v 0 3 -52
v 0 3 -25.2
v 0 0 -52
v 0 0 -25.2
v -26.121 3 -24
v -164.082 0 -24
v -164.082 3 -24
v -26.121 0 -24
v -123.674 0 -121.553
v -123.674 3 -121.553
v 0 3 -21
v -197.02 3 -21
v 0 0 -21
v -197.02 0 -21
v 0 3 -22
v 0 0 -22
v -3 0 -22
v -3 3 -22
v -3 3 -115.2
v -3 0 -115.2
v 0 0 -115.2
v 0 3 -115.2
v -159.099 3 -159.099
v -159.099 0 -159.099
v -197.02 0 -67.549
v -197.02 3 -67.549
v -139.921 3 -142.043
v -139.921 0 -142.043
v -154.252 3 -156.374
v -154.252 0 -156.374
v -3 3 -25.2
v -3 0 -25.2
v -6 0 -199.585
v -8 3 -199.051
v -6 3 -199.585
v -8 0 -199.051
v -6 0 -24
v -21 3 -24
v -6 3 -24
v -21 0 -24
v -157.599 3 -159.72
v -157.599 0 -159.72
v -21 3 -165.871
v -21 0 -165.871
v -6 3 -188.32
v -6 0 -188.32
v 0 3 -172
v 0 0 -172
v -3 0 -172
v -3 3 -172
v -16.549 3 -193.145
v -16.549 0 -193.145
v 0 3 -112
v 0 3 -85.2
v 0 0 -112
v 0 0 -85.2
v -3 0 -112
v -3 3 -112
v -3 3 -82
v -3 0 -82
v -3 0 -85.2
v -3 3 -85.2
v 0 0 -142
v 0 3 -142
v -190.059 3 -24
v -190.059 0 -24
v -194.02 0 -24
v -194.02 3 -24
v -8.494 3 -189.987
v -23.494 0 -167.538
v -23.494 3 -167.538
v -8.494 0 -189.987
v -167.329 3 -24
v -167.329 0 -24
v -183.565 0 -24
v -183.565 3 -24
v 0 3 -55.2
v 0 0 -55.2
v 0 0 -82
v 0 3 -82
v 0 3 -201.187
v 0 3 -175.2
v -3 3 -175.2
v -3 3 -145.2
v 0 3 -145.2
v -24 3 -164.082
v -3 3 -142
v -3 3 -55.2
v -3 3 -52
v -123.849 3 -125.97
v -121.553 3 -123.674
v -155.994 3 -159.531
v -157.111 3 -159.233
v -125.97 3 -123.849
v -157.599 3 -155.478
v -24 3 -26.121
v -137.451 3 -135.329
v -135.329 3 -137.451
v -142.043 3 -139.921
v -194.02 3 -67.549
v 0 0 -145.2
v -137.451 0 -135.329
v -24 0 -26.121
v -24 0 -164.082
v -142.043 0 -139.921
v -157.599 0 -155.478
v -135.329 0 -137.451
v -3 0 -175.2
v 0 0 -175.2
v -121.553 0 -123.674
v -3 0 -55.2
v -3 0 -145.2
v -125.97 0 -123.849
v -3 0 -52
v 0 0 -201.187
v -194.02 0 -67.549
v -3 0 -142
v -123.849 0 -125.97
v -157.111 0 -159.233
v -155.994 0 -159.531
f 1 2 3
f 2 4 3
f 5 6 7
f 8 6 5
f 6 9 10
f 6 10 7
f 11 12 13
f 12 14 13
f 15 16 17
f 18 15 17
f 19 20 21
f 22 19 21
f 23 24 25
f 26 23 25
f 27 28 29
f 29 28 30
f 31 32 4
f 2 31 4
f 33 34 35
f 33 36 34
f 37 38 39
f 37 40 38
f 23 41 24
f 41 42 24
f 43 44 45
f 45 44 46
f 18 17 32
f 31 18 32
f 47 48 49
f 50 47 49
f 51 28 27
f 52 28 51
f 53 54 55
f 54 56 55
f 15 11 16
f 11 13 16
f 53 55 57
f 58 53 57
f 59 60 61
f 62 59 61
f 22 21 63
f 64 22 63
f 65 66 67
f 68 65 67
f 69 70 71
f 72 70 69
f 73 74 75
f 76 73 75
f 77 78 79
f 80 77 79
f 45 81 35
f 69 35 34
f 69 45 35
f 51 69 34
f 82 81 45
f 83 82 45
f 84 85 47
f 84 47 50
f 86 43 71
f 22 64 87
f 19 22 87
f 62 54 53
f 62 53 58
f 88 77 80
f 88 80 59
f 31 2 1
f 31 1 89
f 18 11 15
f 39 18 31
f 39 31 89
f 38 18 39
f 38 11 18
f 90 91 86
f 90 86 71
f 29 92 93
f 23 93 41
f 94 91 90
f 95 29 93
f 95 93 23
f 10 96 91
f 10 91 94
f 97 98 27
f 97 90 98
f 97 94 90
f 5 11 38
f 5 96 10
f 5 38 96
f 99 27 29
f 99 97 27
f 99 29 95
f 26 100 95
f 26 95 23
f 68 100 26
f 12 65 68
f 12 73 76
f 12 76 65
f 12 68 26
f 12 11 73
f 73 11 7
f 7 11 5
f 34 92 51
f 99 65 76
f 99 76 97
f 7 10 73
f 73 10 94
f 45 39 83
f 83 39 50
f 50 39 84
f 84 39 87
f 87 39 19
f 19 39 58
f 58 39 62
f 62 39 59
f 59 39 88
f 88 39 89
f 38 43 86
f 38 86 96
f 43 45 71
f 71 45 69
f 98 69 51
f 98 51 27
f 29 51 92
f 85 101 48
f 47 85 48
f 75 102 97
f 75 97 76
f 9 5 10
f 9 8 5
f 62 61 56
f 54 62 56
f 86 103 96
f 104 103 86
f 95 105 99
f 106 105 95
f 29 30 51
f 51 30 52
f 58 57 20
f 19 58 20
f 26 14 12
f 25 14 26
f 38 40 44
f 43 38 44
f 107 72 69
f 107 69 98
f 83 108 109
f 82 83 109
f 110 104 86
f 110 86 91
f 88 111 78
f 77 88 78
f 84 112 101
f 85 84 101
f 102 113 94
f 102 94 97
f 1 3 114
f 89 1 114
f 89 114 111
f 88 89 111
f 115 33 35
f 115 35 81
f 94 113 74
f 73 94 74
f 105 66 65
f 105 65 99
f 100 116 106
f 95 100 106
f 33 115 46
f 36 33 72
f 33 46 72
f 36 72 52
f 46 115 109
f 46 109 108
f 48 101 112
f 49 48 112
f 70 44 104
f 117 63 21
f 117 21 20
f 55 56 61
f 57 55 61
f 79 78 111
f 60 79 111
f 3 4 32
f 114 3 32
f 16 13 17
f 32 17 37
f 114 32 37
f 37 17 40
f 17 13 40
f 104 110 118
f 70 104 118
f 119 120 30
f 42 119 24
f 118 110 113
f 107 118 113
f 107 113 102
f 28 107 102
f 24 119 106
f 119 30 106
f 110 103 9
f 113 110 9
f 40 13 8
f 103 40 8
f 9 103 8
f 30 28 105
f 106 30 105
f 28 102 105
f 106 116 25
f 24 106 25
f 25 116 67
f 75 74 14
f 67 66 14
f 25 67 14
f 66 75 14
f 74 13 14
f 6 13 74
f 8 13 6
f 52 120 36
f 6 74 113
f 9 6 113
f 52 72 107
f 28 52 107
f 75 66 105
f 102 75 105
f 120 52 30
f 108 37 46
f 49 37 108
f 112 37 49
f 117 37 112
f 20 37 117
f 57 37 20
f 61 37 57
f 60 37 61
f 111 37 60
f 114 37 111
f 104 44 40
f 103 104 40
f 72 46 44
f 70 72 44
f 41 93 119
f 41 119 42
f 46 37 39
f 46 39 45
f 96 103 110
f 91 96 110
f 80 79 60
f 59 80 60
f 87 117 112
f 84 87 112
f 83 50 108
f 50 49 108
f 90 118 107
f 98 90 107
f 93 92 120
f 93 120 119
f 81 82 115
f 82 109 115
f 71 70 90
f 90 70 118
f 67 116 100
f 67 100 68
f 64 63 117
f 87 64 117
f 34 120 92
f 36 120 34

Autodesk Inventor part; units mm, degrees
ref_plane "YZ Plane" through (0, 0, 0) normal (1, 0, 0) x (0, 1, 0)
ref_plane "XZ Plane" through (0, 0, 0) normal (0, 1, 0) x (-1, 0, 0)
ref_plane "XY Plane" through (0, 0, 0) normal (0, 0, 1) x (1, 0, 0)
sketch "草圖1" plane through (0, 0, 0) normal (0, 1, 0) x (-1, 0, 0)
  line L0 (0, 0) -> (0, -200)
  line L1 (0, 0) -> (200, 0)
  line L2 (0, 0) -> (141.4214, -141.4214)
  line L3 (200, 0) -> (141.4214, -141.4214)
  line L4 (141.4214, -141.4214) -> (0, -200)
  line L5 (191.0204, -6) -> (6, -6)
  line L6 (6, -6) -> (6, -191.0204)
  line L7 (6, -191.0204) -> (136.8292, -136.8292)
  line L8 (136.8292, -136.8292) -> (191.0204, -6)
  line L9 (2.1213, 0) -> (142.0427, -139.9214)
  line L10 (0, -2.1213) -> (139.9214, -142.0427)
  line L11 (168.5713, -21) -> (21, -21)
  line L12 (21, -21) -> (21, -168.5713)
  line L13 (21, -168.5713) -> (125.3487, -125.3487)
  line L14 (125.3487, -125.3487) -> (168.5713, -21)
  line L15 (164.0815, -24) -> (24, -24)
  line L16 (24, -24) -> (24, -164.0815)
  line L17 (24, -164.0815) -> (123.0526, -123.0526)
  line L18 (123.0526, -123.0526) -> (164.0815, -24)
  line L19 (191.0204, -6) -> (168.5713, -21)
  line L20 (191.8537, -7.2472) -> (169.4046, -22.2472)
  line L21 (190.187, -4.7528) -> (167.7379, -19.7528)
  line L22 (167.7379, -19.7528) -> (161.3815, -24)
  line L23 (169.4046, -22.2472) -> (163.0482, -26.4944)
  line L24 (24, -164.0815) -> (6, -191.0204)
  line L25 (25.2472, -164.9148) -> (7.2472, -191.8537)
  line L26 (22.7528, -163.2481) -> (4.7528, -190.187)
  line L27 (175, 0) -> (171.8, 0)
  line L28 (171.8, 0) -> (171.8, -3)
  line L29 (171.8, -3) -> (175, -3)
  line L30 (175, -3) -> (175, 0)
  line L31 (141.8, -3) -> (145, -3)
  line L32 (141.8, 0) -> (141.8, -3)
  line L33 (145, -3) -> (145, 0)
  line L34 (111.8, -3) -> (115, -3)
  line L35 (111.8, 0) -> (111.8, -3)
  line L36 (115, -3) -> (115, 0)
  line L37 (81.8, -3) -> (85, -3)
  line L38 (81.8, 0) -> (81.8, -3)
  line L39 (85, -3) -> (85, 0)
  line L40 (51.8, -3) -> (55, -3)
  line L41 (51.8, 0) -> (51.8, -3)
  line L42 (55, -3) -> (55, 0)
  line L43 (21.8, -3) -> (25, -3)
  line L44 (21.8, 0) -> (21.8, -3)
  line L45 (25, -3) -> (25, 0)
  line L46 (0, -200) -> (0, -222)
  line L47 (0, -222) -> (156.9777, -156.9777)
  line L48 (200, 0) -> (222, 0)
  line L49 (141.4214, -141.4214) -> (156.9777, -156.9777)
  line L50 (222, 0) -> (156.9777, -156.9777)
  line L51 (197.0204, 0) -> (197.0204, -60.3062)
  line L52 (0, -222) -> (0, -225)
  line L53 (0, -225) -> (159.099, -159.099)
  line L54 (156.9777, -156.9777) -> (159.099, -159.099)
  line L55 (159.099, -159.099) -> (225, 0)
  line L56 (222, 0) -> (225, 0)
  line L57 (197.0204, -60.3062) -> (197.0204, -67.5488)
  line L58 (0, -200) -> (0, -222)
  line L59 (6, -197.5147) -> (6, -219.5147)
  line L60 (194.0204, -67.5488) -> (194.0204, -14.4361)
  line L61 (142.0427, -139.9214) -> (157.599, -155.4777)
  line L62 (139.9214, -142.0427) -> (157.599, -159.7203)
  line L63 (0, -22) -> (3, -22)
  line L64 (3, -22) -> (3, -25.2)
  line L65 (3, -25.2) -> (0, -25.2)
  line L66 (0, -25.2) -> (0, -22)
  line L67 (3, -52) -> (3, -55.2)
  line L68 (0, -52) -> (3, -52)
  line L69 (3, -55.2) -> (0, -55.2)
  line L70 (3, -82) -> (3, -85.2)
  line L71 (0, -82) -> (3, -82)
  line L72 (3, -85.2) -> (0, -85.2)
  line L73 (3, -112) -> (3, -115.2)
  line L74 (0, -112) -> (3, -112)
  line L75 (3, -115.2) -> (0, -115.2)
  line L76 (3, -142) -> (3, -145.2)
  line L77 (0, -142) -> (3, -142)
  line L78 (3, -145.2) -> (0, -145.2)
  line L79 (3, -172) -> (3, -175.2)
  line L80 (0, -172) -> (3, -172)
  line L81 (3, -175.2) -> (0, -175.2)
  line L82 (21, -21) -> (24, -21)
  line L83 (24, -21) -> (24, -6)
  line L84 (24, -6) -> (21, -6)
  line L85 (21, -6) -> (21, -21)
  line L86 (21, -168.5713) -> (21, -213.3015)
  line L87 (24, -164.0815) -> (24, -212.0589)
  line L88 (21, -213.3015) -> (21, -216.3015)
  line L89 (24, -212.0589) -> (24, -215.0589)
  line L90 (21, -6) -> (21, 0)
  line L91 (168.5713, -21) -> (213.3015, -21)
  line L92 (164.0815, -24) -> (212.0589, -24)
  line L93 (212.0589, -24) -> (215.0589, -24)
  line L94 (213.3015, -21) -> (216.3015, -21)
  line L95 (21, -21) -> (0, -21)
  line L96 (24, -24) -> (6, -24)
  line L97 (6, -197.5147) -> (155.4777, -157.599)
  line L98 (155.9937, -159.5313) -> (8, -199.0507)
  line L99 (8, -199.0507) -> (8, -219.5147)
  line L100 (155.0907, -156.1498) -> (4.5, -196.3627)
  line L101 (4.5, -196.3627) -> (4.5, -219.5147)
  line L102 (155.9937, -159.5313) -> (158.7857, -158.7857)
  line L103 (8, -199.0507) -> (6, -199.5848)
  line L104 (6, -199.5848) -> (0, -201.187)
  point P0 (8.1213, -6)
  point P1 (137.4505, -135.3292)
  point P2 (135.3292, -137.4505)
  point P3 (6, -8.1213)
  point P4 (121.5526, -123.6739)
  point P5 (24, -26.1213)
  point P6 (21, -23.1213)
  point P7 (123.8487, -125.97)
  point P8 (123.6739, -121.5526)
  point P9 (125.97, -123.8487)
  point P10 (23.1213, -21)
  point P11 (26.1213, -24)
  point P12 (21, -165.8714)
  point P13 (6, -188.3204)
  point P14 (8.4944, -189.9871)
  point P15 (23.4944, -167.5381)
  point P16 (188.3204, -6)
  point P17 (165.8714, -21)
  point P18 (167.5381, -23.4944)
  point P19 (189.9871, -8.4944)
  point P20 (171.8, 0)
  point P21 (141.8, 0)
  point P22 (111.8, 0)
  point P23 (81.8, 0)
  point P24 (51.8, 0)
  point P25 (21.8, 0)
  point P26 (156.9777, -156.9777)
  point P27 (197.0204, -7.1935)
  point P28 (157.5991, -156.7203)
  point P29 (0, -25.2)
  point P30 (0, -55.2)
  point P31 (0, -85.2)
  point P32 (0, -115.2)
  point P33 (0, -145.2)
  point P34 (0, -175.2)
  point P35 (167.3286, -24)
  point P36 (183.5645, -24)
  point P37 (190.0589, -24)
  point P38 (194.0204, -24)
  point P39 (197.0204, -21)
  point P40 (21, -24)
  point P41 (21, -21)
  point P42 (154.2524, -156.3737)
  point P43 (16.5488, -193.1453)
  point P44 (157.1115, -159.2328)
  point P45 (0, -201.187)
  dimension "d0" = 200
  dimension "d1" = 200
  dimension "d2" = 45
  dimension "d3" = 67.5
  dimension "d4" = 6
  dimension "d5" = 1.5
  dimension "d6" = 1.5
  dimension "d9" = 15
  dimension "d10" = 3
  dimension "d11" = 1.5
  dimension "d12" = 1.5
  dimension "d13" = 1.5
  dimension "d14" = 1.5
  dimension "d15" = 3
  dimension "d16" = 3.2
  dimension "d17" = 25
  dimension "d20" = 30
  dimension "d27" = 22
  dimension "d28" = 22
  dimension "d29" = 6
  dimension "d30" = 3
  dimension "d31" = 3
  dimension "d32" = 6
  dimension "d34" = 3
  dimension "d35" = 3
  dimension "d36" = 3.2
  dimension "d37" = 22
  dimension "d40" = 30
  dimension "d49" = 3
  dimension "d50" = 2
  dimension "d51" = 1.5
extrude "擠出1" add sketch "草圖1" along normal blind 3 contours L95 L6 L7 L86 L4 L100 L101 L0 L81 L79 L80 L78 L76 L77 L75 L73 L74 L72 L70 L71 L69 L67 L68 L65 L64 L63 | L11 L9 L15 L2 | L2 L96 L10 L12 | L12 L10 L95 | L95 L10 L12 L96 L6 | L15 L9 L18 L2 | L2 L17 L10 L16 | L16 L10 L96 | L11 L22 L15 L9 | L10 L96 L12 | L18 L9 L14 L2 | L2 L13 L10 L17 | L16 L24 L12 L96 L10 | L26 L12 L24 L6 | L14 L9 L8 L2 | L2 L7 L10 L13 | L10 L13 L87 L17 | L18 L23 L92 L14 L9 | L22 L11 L14 L23 L92 L15 | L87 L25 L13 L24 | L24 L86 L25 L7 | L8 L9 L3 L2 | L2 L4 L10 L7 | L18 L92 L23 | L13 L25 L86 | L87 L13 L25 | L91 L20 L23 L14 | L49 L47 L62 L4 | L3 L61 L50 L49 | L10 L4 L87 L7 | L8 L92 L3 L9 | L92 L23 L14 | L14 L23 L20 L91 L8 L92 | L7 L87 L4 L86 | L91 L3 L92 L8 | L54 L102 L62 L47 | L50 L57 L55 L54 | L91 L60 L92 L3 | L62 L97 L87 L100 | L62 L102 L98 L47 | L47 L98 L87 L97 | L54 L53 L62 L102 | L100 L86 L97 L4 | L4 L101 L100 | L100 L87 L97 L86 | L91 L51 L92 L60 | L92 L51 L50 L60 | L87 L98 L86 L97 | L59 L104 L101 L4 | L97 L86 L98 L103 L59 | L101 L104 L46 L4
sketch "草圖2" plane through (-3, 0, -25.2) normal (0, 0, 1) x (1, 0, 0)
  line L0 (0, 0) -> (0, 3) projected
  line L1 (-154.599, 3) -> (-156.099, 3) projected
  line L2 (0, 0) -> (-3, 0)
  line L3 (-3, 0) -> (-3, 3)
  line L4 (-3, 3) -> (0, 3)
  line L5 (0, 3) -> (0, 0)
  circle A0 centre (-1.5, 1.5) radius 2.1213
  point P0 (3, 0)
  point P1 (3, 3)
  dimension "d45" = 3
  dimension "d46" = 4.2426
properties part number "side_sail_2"
